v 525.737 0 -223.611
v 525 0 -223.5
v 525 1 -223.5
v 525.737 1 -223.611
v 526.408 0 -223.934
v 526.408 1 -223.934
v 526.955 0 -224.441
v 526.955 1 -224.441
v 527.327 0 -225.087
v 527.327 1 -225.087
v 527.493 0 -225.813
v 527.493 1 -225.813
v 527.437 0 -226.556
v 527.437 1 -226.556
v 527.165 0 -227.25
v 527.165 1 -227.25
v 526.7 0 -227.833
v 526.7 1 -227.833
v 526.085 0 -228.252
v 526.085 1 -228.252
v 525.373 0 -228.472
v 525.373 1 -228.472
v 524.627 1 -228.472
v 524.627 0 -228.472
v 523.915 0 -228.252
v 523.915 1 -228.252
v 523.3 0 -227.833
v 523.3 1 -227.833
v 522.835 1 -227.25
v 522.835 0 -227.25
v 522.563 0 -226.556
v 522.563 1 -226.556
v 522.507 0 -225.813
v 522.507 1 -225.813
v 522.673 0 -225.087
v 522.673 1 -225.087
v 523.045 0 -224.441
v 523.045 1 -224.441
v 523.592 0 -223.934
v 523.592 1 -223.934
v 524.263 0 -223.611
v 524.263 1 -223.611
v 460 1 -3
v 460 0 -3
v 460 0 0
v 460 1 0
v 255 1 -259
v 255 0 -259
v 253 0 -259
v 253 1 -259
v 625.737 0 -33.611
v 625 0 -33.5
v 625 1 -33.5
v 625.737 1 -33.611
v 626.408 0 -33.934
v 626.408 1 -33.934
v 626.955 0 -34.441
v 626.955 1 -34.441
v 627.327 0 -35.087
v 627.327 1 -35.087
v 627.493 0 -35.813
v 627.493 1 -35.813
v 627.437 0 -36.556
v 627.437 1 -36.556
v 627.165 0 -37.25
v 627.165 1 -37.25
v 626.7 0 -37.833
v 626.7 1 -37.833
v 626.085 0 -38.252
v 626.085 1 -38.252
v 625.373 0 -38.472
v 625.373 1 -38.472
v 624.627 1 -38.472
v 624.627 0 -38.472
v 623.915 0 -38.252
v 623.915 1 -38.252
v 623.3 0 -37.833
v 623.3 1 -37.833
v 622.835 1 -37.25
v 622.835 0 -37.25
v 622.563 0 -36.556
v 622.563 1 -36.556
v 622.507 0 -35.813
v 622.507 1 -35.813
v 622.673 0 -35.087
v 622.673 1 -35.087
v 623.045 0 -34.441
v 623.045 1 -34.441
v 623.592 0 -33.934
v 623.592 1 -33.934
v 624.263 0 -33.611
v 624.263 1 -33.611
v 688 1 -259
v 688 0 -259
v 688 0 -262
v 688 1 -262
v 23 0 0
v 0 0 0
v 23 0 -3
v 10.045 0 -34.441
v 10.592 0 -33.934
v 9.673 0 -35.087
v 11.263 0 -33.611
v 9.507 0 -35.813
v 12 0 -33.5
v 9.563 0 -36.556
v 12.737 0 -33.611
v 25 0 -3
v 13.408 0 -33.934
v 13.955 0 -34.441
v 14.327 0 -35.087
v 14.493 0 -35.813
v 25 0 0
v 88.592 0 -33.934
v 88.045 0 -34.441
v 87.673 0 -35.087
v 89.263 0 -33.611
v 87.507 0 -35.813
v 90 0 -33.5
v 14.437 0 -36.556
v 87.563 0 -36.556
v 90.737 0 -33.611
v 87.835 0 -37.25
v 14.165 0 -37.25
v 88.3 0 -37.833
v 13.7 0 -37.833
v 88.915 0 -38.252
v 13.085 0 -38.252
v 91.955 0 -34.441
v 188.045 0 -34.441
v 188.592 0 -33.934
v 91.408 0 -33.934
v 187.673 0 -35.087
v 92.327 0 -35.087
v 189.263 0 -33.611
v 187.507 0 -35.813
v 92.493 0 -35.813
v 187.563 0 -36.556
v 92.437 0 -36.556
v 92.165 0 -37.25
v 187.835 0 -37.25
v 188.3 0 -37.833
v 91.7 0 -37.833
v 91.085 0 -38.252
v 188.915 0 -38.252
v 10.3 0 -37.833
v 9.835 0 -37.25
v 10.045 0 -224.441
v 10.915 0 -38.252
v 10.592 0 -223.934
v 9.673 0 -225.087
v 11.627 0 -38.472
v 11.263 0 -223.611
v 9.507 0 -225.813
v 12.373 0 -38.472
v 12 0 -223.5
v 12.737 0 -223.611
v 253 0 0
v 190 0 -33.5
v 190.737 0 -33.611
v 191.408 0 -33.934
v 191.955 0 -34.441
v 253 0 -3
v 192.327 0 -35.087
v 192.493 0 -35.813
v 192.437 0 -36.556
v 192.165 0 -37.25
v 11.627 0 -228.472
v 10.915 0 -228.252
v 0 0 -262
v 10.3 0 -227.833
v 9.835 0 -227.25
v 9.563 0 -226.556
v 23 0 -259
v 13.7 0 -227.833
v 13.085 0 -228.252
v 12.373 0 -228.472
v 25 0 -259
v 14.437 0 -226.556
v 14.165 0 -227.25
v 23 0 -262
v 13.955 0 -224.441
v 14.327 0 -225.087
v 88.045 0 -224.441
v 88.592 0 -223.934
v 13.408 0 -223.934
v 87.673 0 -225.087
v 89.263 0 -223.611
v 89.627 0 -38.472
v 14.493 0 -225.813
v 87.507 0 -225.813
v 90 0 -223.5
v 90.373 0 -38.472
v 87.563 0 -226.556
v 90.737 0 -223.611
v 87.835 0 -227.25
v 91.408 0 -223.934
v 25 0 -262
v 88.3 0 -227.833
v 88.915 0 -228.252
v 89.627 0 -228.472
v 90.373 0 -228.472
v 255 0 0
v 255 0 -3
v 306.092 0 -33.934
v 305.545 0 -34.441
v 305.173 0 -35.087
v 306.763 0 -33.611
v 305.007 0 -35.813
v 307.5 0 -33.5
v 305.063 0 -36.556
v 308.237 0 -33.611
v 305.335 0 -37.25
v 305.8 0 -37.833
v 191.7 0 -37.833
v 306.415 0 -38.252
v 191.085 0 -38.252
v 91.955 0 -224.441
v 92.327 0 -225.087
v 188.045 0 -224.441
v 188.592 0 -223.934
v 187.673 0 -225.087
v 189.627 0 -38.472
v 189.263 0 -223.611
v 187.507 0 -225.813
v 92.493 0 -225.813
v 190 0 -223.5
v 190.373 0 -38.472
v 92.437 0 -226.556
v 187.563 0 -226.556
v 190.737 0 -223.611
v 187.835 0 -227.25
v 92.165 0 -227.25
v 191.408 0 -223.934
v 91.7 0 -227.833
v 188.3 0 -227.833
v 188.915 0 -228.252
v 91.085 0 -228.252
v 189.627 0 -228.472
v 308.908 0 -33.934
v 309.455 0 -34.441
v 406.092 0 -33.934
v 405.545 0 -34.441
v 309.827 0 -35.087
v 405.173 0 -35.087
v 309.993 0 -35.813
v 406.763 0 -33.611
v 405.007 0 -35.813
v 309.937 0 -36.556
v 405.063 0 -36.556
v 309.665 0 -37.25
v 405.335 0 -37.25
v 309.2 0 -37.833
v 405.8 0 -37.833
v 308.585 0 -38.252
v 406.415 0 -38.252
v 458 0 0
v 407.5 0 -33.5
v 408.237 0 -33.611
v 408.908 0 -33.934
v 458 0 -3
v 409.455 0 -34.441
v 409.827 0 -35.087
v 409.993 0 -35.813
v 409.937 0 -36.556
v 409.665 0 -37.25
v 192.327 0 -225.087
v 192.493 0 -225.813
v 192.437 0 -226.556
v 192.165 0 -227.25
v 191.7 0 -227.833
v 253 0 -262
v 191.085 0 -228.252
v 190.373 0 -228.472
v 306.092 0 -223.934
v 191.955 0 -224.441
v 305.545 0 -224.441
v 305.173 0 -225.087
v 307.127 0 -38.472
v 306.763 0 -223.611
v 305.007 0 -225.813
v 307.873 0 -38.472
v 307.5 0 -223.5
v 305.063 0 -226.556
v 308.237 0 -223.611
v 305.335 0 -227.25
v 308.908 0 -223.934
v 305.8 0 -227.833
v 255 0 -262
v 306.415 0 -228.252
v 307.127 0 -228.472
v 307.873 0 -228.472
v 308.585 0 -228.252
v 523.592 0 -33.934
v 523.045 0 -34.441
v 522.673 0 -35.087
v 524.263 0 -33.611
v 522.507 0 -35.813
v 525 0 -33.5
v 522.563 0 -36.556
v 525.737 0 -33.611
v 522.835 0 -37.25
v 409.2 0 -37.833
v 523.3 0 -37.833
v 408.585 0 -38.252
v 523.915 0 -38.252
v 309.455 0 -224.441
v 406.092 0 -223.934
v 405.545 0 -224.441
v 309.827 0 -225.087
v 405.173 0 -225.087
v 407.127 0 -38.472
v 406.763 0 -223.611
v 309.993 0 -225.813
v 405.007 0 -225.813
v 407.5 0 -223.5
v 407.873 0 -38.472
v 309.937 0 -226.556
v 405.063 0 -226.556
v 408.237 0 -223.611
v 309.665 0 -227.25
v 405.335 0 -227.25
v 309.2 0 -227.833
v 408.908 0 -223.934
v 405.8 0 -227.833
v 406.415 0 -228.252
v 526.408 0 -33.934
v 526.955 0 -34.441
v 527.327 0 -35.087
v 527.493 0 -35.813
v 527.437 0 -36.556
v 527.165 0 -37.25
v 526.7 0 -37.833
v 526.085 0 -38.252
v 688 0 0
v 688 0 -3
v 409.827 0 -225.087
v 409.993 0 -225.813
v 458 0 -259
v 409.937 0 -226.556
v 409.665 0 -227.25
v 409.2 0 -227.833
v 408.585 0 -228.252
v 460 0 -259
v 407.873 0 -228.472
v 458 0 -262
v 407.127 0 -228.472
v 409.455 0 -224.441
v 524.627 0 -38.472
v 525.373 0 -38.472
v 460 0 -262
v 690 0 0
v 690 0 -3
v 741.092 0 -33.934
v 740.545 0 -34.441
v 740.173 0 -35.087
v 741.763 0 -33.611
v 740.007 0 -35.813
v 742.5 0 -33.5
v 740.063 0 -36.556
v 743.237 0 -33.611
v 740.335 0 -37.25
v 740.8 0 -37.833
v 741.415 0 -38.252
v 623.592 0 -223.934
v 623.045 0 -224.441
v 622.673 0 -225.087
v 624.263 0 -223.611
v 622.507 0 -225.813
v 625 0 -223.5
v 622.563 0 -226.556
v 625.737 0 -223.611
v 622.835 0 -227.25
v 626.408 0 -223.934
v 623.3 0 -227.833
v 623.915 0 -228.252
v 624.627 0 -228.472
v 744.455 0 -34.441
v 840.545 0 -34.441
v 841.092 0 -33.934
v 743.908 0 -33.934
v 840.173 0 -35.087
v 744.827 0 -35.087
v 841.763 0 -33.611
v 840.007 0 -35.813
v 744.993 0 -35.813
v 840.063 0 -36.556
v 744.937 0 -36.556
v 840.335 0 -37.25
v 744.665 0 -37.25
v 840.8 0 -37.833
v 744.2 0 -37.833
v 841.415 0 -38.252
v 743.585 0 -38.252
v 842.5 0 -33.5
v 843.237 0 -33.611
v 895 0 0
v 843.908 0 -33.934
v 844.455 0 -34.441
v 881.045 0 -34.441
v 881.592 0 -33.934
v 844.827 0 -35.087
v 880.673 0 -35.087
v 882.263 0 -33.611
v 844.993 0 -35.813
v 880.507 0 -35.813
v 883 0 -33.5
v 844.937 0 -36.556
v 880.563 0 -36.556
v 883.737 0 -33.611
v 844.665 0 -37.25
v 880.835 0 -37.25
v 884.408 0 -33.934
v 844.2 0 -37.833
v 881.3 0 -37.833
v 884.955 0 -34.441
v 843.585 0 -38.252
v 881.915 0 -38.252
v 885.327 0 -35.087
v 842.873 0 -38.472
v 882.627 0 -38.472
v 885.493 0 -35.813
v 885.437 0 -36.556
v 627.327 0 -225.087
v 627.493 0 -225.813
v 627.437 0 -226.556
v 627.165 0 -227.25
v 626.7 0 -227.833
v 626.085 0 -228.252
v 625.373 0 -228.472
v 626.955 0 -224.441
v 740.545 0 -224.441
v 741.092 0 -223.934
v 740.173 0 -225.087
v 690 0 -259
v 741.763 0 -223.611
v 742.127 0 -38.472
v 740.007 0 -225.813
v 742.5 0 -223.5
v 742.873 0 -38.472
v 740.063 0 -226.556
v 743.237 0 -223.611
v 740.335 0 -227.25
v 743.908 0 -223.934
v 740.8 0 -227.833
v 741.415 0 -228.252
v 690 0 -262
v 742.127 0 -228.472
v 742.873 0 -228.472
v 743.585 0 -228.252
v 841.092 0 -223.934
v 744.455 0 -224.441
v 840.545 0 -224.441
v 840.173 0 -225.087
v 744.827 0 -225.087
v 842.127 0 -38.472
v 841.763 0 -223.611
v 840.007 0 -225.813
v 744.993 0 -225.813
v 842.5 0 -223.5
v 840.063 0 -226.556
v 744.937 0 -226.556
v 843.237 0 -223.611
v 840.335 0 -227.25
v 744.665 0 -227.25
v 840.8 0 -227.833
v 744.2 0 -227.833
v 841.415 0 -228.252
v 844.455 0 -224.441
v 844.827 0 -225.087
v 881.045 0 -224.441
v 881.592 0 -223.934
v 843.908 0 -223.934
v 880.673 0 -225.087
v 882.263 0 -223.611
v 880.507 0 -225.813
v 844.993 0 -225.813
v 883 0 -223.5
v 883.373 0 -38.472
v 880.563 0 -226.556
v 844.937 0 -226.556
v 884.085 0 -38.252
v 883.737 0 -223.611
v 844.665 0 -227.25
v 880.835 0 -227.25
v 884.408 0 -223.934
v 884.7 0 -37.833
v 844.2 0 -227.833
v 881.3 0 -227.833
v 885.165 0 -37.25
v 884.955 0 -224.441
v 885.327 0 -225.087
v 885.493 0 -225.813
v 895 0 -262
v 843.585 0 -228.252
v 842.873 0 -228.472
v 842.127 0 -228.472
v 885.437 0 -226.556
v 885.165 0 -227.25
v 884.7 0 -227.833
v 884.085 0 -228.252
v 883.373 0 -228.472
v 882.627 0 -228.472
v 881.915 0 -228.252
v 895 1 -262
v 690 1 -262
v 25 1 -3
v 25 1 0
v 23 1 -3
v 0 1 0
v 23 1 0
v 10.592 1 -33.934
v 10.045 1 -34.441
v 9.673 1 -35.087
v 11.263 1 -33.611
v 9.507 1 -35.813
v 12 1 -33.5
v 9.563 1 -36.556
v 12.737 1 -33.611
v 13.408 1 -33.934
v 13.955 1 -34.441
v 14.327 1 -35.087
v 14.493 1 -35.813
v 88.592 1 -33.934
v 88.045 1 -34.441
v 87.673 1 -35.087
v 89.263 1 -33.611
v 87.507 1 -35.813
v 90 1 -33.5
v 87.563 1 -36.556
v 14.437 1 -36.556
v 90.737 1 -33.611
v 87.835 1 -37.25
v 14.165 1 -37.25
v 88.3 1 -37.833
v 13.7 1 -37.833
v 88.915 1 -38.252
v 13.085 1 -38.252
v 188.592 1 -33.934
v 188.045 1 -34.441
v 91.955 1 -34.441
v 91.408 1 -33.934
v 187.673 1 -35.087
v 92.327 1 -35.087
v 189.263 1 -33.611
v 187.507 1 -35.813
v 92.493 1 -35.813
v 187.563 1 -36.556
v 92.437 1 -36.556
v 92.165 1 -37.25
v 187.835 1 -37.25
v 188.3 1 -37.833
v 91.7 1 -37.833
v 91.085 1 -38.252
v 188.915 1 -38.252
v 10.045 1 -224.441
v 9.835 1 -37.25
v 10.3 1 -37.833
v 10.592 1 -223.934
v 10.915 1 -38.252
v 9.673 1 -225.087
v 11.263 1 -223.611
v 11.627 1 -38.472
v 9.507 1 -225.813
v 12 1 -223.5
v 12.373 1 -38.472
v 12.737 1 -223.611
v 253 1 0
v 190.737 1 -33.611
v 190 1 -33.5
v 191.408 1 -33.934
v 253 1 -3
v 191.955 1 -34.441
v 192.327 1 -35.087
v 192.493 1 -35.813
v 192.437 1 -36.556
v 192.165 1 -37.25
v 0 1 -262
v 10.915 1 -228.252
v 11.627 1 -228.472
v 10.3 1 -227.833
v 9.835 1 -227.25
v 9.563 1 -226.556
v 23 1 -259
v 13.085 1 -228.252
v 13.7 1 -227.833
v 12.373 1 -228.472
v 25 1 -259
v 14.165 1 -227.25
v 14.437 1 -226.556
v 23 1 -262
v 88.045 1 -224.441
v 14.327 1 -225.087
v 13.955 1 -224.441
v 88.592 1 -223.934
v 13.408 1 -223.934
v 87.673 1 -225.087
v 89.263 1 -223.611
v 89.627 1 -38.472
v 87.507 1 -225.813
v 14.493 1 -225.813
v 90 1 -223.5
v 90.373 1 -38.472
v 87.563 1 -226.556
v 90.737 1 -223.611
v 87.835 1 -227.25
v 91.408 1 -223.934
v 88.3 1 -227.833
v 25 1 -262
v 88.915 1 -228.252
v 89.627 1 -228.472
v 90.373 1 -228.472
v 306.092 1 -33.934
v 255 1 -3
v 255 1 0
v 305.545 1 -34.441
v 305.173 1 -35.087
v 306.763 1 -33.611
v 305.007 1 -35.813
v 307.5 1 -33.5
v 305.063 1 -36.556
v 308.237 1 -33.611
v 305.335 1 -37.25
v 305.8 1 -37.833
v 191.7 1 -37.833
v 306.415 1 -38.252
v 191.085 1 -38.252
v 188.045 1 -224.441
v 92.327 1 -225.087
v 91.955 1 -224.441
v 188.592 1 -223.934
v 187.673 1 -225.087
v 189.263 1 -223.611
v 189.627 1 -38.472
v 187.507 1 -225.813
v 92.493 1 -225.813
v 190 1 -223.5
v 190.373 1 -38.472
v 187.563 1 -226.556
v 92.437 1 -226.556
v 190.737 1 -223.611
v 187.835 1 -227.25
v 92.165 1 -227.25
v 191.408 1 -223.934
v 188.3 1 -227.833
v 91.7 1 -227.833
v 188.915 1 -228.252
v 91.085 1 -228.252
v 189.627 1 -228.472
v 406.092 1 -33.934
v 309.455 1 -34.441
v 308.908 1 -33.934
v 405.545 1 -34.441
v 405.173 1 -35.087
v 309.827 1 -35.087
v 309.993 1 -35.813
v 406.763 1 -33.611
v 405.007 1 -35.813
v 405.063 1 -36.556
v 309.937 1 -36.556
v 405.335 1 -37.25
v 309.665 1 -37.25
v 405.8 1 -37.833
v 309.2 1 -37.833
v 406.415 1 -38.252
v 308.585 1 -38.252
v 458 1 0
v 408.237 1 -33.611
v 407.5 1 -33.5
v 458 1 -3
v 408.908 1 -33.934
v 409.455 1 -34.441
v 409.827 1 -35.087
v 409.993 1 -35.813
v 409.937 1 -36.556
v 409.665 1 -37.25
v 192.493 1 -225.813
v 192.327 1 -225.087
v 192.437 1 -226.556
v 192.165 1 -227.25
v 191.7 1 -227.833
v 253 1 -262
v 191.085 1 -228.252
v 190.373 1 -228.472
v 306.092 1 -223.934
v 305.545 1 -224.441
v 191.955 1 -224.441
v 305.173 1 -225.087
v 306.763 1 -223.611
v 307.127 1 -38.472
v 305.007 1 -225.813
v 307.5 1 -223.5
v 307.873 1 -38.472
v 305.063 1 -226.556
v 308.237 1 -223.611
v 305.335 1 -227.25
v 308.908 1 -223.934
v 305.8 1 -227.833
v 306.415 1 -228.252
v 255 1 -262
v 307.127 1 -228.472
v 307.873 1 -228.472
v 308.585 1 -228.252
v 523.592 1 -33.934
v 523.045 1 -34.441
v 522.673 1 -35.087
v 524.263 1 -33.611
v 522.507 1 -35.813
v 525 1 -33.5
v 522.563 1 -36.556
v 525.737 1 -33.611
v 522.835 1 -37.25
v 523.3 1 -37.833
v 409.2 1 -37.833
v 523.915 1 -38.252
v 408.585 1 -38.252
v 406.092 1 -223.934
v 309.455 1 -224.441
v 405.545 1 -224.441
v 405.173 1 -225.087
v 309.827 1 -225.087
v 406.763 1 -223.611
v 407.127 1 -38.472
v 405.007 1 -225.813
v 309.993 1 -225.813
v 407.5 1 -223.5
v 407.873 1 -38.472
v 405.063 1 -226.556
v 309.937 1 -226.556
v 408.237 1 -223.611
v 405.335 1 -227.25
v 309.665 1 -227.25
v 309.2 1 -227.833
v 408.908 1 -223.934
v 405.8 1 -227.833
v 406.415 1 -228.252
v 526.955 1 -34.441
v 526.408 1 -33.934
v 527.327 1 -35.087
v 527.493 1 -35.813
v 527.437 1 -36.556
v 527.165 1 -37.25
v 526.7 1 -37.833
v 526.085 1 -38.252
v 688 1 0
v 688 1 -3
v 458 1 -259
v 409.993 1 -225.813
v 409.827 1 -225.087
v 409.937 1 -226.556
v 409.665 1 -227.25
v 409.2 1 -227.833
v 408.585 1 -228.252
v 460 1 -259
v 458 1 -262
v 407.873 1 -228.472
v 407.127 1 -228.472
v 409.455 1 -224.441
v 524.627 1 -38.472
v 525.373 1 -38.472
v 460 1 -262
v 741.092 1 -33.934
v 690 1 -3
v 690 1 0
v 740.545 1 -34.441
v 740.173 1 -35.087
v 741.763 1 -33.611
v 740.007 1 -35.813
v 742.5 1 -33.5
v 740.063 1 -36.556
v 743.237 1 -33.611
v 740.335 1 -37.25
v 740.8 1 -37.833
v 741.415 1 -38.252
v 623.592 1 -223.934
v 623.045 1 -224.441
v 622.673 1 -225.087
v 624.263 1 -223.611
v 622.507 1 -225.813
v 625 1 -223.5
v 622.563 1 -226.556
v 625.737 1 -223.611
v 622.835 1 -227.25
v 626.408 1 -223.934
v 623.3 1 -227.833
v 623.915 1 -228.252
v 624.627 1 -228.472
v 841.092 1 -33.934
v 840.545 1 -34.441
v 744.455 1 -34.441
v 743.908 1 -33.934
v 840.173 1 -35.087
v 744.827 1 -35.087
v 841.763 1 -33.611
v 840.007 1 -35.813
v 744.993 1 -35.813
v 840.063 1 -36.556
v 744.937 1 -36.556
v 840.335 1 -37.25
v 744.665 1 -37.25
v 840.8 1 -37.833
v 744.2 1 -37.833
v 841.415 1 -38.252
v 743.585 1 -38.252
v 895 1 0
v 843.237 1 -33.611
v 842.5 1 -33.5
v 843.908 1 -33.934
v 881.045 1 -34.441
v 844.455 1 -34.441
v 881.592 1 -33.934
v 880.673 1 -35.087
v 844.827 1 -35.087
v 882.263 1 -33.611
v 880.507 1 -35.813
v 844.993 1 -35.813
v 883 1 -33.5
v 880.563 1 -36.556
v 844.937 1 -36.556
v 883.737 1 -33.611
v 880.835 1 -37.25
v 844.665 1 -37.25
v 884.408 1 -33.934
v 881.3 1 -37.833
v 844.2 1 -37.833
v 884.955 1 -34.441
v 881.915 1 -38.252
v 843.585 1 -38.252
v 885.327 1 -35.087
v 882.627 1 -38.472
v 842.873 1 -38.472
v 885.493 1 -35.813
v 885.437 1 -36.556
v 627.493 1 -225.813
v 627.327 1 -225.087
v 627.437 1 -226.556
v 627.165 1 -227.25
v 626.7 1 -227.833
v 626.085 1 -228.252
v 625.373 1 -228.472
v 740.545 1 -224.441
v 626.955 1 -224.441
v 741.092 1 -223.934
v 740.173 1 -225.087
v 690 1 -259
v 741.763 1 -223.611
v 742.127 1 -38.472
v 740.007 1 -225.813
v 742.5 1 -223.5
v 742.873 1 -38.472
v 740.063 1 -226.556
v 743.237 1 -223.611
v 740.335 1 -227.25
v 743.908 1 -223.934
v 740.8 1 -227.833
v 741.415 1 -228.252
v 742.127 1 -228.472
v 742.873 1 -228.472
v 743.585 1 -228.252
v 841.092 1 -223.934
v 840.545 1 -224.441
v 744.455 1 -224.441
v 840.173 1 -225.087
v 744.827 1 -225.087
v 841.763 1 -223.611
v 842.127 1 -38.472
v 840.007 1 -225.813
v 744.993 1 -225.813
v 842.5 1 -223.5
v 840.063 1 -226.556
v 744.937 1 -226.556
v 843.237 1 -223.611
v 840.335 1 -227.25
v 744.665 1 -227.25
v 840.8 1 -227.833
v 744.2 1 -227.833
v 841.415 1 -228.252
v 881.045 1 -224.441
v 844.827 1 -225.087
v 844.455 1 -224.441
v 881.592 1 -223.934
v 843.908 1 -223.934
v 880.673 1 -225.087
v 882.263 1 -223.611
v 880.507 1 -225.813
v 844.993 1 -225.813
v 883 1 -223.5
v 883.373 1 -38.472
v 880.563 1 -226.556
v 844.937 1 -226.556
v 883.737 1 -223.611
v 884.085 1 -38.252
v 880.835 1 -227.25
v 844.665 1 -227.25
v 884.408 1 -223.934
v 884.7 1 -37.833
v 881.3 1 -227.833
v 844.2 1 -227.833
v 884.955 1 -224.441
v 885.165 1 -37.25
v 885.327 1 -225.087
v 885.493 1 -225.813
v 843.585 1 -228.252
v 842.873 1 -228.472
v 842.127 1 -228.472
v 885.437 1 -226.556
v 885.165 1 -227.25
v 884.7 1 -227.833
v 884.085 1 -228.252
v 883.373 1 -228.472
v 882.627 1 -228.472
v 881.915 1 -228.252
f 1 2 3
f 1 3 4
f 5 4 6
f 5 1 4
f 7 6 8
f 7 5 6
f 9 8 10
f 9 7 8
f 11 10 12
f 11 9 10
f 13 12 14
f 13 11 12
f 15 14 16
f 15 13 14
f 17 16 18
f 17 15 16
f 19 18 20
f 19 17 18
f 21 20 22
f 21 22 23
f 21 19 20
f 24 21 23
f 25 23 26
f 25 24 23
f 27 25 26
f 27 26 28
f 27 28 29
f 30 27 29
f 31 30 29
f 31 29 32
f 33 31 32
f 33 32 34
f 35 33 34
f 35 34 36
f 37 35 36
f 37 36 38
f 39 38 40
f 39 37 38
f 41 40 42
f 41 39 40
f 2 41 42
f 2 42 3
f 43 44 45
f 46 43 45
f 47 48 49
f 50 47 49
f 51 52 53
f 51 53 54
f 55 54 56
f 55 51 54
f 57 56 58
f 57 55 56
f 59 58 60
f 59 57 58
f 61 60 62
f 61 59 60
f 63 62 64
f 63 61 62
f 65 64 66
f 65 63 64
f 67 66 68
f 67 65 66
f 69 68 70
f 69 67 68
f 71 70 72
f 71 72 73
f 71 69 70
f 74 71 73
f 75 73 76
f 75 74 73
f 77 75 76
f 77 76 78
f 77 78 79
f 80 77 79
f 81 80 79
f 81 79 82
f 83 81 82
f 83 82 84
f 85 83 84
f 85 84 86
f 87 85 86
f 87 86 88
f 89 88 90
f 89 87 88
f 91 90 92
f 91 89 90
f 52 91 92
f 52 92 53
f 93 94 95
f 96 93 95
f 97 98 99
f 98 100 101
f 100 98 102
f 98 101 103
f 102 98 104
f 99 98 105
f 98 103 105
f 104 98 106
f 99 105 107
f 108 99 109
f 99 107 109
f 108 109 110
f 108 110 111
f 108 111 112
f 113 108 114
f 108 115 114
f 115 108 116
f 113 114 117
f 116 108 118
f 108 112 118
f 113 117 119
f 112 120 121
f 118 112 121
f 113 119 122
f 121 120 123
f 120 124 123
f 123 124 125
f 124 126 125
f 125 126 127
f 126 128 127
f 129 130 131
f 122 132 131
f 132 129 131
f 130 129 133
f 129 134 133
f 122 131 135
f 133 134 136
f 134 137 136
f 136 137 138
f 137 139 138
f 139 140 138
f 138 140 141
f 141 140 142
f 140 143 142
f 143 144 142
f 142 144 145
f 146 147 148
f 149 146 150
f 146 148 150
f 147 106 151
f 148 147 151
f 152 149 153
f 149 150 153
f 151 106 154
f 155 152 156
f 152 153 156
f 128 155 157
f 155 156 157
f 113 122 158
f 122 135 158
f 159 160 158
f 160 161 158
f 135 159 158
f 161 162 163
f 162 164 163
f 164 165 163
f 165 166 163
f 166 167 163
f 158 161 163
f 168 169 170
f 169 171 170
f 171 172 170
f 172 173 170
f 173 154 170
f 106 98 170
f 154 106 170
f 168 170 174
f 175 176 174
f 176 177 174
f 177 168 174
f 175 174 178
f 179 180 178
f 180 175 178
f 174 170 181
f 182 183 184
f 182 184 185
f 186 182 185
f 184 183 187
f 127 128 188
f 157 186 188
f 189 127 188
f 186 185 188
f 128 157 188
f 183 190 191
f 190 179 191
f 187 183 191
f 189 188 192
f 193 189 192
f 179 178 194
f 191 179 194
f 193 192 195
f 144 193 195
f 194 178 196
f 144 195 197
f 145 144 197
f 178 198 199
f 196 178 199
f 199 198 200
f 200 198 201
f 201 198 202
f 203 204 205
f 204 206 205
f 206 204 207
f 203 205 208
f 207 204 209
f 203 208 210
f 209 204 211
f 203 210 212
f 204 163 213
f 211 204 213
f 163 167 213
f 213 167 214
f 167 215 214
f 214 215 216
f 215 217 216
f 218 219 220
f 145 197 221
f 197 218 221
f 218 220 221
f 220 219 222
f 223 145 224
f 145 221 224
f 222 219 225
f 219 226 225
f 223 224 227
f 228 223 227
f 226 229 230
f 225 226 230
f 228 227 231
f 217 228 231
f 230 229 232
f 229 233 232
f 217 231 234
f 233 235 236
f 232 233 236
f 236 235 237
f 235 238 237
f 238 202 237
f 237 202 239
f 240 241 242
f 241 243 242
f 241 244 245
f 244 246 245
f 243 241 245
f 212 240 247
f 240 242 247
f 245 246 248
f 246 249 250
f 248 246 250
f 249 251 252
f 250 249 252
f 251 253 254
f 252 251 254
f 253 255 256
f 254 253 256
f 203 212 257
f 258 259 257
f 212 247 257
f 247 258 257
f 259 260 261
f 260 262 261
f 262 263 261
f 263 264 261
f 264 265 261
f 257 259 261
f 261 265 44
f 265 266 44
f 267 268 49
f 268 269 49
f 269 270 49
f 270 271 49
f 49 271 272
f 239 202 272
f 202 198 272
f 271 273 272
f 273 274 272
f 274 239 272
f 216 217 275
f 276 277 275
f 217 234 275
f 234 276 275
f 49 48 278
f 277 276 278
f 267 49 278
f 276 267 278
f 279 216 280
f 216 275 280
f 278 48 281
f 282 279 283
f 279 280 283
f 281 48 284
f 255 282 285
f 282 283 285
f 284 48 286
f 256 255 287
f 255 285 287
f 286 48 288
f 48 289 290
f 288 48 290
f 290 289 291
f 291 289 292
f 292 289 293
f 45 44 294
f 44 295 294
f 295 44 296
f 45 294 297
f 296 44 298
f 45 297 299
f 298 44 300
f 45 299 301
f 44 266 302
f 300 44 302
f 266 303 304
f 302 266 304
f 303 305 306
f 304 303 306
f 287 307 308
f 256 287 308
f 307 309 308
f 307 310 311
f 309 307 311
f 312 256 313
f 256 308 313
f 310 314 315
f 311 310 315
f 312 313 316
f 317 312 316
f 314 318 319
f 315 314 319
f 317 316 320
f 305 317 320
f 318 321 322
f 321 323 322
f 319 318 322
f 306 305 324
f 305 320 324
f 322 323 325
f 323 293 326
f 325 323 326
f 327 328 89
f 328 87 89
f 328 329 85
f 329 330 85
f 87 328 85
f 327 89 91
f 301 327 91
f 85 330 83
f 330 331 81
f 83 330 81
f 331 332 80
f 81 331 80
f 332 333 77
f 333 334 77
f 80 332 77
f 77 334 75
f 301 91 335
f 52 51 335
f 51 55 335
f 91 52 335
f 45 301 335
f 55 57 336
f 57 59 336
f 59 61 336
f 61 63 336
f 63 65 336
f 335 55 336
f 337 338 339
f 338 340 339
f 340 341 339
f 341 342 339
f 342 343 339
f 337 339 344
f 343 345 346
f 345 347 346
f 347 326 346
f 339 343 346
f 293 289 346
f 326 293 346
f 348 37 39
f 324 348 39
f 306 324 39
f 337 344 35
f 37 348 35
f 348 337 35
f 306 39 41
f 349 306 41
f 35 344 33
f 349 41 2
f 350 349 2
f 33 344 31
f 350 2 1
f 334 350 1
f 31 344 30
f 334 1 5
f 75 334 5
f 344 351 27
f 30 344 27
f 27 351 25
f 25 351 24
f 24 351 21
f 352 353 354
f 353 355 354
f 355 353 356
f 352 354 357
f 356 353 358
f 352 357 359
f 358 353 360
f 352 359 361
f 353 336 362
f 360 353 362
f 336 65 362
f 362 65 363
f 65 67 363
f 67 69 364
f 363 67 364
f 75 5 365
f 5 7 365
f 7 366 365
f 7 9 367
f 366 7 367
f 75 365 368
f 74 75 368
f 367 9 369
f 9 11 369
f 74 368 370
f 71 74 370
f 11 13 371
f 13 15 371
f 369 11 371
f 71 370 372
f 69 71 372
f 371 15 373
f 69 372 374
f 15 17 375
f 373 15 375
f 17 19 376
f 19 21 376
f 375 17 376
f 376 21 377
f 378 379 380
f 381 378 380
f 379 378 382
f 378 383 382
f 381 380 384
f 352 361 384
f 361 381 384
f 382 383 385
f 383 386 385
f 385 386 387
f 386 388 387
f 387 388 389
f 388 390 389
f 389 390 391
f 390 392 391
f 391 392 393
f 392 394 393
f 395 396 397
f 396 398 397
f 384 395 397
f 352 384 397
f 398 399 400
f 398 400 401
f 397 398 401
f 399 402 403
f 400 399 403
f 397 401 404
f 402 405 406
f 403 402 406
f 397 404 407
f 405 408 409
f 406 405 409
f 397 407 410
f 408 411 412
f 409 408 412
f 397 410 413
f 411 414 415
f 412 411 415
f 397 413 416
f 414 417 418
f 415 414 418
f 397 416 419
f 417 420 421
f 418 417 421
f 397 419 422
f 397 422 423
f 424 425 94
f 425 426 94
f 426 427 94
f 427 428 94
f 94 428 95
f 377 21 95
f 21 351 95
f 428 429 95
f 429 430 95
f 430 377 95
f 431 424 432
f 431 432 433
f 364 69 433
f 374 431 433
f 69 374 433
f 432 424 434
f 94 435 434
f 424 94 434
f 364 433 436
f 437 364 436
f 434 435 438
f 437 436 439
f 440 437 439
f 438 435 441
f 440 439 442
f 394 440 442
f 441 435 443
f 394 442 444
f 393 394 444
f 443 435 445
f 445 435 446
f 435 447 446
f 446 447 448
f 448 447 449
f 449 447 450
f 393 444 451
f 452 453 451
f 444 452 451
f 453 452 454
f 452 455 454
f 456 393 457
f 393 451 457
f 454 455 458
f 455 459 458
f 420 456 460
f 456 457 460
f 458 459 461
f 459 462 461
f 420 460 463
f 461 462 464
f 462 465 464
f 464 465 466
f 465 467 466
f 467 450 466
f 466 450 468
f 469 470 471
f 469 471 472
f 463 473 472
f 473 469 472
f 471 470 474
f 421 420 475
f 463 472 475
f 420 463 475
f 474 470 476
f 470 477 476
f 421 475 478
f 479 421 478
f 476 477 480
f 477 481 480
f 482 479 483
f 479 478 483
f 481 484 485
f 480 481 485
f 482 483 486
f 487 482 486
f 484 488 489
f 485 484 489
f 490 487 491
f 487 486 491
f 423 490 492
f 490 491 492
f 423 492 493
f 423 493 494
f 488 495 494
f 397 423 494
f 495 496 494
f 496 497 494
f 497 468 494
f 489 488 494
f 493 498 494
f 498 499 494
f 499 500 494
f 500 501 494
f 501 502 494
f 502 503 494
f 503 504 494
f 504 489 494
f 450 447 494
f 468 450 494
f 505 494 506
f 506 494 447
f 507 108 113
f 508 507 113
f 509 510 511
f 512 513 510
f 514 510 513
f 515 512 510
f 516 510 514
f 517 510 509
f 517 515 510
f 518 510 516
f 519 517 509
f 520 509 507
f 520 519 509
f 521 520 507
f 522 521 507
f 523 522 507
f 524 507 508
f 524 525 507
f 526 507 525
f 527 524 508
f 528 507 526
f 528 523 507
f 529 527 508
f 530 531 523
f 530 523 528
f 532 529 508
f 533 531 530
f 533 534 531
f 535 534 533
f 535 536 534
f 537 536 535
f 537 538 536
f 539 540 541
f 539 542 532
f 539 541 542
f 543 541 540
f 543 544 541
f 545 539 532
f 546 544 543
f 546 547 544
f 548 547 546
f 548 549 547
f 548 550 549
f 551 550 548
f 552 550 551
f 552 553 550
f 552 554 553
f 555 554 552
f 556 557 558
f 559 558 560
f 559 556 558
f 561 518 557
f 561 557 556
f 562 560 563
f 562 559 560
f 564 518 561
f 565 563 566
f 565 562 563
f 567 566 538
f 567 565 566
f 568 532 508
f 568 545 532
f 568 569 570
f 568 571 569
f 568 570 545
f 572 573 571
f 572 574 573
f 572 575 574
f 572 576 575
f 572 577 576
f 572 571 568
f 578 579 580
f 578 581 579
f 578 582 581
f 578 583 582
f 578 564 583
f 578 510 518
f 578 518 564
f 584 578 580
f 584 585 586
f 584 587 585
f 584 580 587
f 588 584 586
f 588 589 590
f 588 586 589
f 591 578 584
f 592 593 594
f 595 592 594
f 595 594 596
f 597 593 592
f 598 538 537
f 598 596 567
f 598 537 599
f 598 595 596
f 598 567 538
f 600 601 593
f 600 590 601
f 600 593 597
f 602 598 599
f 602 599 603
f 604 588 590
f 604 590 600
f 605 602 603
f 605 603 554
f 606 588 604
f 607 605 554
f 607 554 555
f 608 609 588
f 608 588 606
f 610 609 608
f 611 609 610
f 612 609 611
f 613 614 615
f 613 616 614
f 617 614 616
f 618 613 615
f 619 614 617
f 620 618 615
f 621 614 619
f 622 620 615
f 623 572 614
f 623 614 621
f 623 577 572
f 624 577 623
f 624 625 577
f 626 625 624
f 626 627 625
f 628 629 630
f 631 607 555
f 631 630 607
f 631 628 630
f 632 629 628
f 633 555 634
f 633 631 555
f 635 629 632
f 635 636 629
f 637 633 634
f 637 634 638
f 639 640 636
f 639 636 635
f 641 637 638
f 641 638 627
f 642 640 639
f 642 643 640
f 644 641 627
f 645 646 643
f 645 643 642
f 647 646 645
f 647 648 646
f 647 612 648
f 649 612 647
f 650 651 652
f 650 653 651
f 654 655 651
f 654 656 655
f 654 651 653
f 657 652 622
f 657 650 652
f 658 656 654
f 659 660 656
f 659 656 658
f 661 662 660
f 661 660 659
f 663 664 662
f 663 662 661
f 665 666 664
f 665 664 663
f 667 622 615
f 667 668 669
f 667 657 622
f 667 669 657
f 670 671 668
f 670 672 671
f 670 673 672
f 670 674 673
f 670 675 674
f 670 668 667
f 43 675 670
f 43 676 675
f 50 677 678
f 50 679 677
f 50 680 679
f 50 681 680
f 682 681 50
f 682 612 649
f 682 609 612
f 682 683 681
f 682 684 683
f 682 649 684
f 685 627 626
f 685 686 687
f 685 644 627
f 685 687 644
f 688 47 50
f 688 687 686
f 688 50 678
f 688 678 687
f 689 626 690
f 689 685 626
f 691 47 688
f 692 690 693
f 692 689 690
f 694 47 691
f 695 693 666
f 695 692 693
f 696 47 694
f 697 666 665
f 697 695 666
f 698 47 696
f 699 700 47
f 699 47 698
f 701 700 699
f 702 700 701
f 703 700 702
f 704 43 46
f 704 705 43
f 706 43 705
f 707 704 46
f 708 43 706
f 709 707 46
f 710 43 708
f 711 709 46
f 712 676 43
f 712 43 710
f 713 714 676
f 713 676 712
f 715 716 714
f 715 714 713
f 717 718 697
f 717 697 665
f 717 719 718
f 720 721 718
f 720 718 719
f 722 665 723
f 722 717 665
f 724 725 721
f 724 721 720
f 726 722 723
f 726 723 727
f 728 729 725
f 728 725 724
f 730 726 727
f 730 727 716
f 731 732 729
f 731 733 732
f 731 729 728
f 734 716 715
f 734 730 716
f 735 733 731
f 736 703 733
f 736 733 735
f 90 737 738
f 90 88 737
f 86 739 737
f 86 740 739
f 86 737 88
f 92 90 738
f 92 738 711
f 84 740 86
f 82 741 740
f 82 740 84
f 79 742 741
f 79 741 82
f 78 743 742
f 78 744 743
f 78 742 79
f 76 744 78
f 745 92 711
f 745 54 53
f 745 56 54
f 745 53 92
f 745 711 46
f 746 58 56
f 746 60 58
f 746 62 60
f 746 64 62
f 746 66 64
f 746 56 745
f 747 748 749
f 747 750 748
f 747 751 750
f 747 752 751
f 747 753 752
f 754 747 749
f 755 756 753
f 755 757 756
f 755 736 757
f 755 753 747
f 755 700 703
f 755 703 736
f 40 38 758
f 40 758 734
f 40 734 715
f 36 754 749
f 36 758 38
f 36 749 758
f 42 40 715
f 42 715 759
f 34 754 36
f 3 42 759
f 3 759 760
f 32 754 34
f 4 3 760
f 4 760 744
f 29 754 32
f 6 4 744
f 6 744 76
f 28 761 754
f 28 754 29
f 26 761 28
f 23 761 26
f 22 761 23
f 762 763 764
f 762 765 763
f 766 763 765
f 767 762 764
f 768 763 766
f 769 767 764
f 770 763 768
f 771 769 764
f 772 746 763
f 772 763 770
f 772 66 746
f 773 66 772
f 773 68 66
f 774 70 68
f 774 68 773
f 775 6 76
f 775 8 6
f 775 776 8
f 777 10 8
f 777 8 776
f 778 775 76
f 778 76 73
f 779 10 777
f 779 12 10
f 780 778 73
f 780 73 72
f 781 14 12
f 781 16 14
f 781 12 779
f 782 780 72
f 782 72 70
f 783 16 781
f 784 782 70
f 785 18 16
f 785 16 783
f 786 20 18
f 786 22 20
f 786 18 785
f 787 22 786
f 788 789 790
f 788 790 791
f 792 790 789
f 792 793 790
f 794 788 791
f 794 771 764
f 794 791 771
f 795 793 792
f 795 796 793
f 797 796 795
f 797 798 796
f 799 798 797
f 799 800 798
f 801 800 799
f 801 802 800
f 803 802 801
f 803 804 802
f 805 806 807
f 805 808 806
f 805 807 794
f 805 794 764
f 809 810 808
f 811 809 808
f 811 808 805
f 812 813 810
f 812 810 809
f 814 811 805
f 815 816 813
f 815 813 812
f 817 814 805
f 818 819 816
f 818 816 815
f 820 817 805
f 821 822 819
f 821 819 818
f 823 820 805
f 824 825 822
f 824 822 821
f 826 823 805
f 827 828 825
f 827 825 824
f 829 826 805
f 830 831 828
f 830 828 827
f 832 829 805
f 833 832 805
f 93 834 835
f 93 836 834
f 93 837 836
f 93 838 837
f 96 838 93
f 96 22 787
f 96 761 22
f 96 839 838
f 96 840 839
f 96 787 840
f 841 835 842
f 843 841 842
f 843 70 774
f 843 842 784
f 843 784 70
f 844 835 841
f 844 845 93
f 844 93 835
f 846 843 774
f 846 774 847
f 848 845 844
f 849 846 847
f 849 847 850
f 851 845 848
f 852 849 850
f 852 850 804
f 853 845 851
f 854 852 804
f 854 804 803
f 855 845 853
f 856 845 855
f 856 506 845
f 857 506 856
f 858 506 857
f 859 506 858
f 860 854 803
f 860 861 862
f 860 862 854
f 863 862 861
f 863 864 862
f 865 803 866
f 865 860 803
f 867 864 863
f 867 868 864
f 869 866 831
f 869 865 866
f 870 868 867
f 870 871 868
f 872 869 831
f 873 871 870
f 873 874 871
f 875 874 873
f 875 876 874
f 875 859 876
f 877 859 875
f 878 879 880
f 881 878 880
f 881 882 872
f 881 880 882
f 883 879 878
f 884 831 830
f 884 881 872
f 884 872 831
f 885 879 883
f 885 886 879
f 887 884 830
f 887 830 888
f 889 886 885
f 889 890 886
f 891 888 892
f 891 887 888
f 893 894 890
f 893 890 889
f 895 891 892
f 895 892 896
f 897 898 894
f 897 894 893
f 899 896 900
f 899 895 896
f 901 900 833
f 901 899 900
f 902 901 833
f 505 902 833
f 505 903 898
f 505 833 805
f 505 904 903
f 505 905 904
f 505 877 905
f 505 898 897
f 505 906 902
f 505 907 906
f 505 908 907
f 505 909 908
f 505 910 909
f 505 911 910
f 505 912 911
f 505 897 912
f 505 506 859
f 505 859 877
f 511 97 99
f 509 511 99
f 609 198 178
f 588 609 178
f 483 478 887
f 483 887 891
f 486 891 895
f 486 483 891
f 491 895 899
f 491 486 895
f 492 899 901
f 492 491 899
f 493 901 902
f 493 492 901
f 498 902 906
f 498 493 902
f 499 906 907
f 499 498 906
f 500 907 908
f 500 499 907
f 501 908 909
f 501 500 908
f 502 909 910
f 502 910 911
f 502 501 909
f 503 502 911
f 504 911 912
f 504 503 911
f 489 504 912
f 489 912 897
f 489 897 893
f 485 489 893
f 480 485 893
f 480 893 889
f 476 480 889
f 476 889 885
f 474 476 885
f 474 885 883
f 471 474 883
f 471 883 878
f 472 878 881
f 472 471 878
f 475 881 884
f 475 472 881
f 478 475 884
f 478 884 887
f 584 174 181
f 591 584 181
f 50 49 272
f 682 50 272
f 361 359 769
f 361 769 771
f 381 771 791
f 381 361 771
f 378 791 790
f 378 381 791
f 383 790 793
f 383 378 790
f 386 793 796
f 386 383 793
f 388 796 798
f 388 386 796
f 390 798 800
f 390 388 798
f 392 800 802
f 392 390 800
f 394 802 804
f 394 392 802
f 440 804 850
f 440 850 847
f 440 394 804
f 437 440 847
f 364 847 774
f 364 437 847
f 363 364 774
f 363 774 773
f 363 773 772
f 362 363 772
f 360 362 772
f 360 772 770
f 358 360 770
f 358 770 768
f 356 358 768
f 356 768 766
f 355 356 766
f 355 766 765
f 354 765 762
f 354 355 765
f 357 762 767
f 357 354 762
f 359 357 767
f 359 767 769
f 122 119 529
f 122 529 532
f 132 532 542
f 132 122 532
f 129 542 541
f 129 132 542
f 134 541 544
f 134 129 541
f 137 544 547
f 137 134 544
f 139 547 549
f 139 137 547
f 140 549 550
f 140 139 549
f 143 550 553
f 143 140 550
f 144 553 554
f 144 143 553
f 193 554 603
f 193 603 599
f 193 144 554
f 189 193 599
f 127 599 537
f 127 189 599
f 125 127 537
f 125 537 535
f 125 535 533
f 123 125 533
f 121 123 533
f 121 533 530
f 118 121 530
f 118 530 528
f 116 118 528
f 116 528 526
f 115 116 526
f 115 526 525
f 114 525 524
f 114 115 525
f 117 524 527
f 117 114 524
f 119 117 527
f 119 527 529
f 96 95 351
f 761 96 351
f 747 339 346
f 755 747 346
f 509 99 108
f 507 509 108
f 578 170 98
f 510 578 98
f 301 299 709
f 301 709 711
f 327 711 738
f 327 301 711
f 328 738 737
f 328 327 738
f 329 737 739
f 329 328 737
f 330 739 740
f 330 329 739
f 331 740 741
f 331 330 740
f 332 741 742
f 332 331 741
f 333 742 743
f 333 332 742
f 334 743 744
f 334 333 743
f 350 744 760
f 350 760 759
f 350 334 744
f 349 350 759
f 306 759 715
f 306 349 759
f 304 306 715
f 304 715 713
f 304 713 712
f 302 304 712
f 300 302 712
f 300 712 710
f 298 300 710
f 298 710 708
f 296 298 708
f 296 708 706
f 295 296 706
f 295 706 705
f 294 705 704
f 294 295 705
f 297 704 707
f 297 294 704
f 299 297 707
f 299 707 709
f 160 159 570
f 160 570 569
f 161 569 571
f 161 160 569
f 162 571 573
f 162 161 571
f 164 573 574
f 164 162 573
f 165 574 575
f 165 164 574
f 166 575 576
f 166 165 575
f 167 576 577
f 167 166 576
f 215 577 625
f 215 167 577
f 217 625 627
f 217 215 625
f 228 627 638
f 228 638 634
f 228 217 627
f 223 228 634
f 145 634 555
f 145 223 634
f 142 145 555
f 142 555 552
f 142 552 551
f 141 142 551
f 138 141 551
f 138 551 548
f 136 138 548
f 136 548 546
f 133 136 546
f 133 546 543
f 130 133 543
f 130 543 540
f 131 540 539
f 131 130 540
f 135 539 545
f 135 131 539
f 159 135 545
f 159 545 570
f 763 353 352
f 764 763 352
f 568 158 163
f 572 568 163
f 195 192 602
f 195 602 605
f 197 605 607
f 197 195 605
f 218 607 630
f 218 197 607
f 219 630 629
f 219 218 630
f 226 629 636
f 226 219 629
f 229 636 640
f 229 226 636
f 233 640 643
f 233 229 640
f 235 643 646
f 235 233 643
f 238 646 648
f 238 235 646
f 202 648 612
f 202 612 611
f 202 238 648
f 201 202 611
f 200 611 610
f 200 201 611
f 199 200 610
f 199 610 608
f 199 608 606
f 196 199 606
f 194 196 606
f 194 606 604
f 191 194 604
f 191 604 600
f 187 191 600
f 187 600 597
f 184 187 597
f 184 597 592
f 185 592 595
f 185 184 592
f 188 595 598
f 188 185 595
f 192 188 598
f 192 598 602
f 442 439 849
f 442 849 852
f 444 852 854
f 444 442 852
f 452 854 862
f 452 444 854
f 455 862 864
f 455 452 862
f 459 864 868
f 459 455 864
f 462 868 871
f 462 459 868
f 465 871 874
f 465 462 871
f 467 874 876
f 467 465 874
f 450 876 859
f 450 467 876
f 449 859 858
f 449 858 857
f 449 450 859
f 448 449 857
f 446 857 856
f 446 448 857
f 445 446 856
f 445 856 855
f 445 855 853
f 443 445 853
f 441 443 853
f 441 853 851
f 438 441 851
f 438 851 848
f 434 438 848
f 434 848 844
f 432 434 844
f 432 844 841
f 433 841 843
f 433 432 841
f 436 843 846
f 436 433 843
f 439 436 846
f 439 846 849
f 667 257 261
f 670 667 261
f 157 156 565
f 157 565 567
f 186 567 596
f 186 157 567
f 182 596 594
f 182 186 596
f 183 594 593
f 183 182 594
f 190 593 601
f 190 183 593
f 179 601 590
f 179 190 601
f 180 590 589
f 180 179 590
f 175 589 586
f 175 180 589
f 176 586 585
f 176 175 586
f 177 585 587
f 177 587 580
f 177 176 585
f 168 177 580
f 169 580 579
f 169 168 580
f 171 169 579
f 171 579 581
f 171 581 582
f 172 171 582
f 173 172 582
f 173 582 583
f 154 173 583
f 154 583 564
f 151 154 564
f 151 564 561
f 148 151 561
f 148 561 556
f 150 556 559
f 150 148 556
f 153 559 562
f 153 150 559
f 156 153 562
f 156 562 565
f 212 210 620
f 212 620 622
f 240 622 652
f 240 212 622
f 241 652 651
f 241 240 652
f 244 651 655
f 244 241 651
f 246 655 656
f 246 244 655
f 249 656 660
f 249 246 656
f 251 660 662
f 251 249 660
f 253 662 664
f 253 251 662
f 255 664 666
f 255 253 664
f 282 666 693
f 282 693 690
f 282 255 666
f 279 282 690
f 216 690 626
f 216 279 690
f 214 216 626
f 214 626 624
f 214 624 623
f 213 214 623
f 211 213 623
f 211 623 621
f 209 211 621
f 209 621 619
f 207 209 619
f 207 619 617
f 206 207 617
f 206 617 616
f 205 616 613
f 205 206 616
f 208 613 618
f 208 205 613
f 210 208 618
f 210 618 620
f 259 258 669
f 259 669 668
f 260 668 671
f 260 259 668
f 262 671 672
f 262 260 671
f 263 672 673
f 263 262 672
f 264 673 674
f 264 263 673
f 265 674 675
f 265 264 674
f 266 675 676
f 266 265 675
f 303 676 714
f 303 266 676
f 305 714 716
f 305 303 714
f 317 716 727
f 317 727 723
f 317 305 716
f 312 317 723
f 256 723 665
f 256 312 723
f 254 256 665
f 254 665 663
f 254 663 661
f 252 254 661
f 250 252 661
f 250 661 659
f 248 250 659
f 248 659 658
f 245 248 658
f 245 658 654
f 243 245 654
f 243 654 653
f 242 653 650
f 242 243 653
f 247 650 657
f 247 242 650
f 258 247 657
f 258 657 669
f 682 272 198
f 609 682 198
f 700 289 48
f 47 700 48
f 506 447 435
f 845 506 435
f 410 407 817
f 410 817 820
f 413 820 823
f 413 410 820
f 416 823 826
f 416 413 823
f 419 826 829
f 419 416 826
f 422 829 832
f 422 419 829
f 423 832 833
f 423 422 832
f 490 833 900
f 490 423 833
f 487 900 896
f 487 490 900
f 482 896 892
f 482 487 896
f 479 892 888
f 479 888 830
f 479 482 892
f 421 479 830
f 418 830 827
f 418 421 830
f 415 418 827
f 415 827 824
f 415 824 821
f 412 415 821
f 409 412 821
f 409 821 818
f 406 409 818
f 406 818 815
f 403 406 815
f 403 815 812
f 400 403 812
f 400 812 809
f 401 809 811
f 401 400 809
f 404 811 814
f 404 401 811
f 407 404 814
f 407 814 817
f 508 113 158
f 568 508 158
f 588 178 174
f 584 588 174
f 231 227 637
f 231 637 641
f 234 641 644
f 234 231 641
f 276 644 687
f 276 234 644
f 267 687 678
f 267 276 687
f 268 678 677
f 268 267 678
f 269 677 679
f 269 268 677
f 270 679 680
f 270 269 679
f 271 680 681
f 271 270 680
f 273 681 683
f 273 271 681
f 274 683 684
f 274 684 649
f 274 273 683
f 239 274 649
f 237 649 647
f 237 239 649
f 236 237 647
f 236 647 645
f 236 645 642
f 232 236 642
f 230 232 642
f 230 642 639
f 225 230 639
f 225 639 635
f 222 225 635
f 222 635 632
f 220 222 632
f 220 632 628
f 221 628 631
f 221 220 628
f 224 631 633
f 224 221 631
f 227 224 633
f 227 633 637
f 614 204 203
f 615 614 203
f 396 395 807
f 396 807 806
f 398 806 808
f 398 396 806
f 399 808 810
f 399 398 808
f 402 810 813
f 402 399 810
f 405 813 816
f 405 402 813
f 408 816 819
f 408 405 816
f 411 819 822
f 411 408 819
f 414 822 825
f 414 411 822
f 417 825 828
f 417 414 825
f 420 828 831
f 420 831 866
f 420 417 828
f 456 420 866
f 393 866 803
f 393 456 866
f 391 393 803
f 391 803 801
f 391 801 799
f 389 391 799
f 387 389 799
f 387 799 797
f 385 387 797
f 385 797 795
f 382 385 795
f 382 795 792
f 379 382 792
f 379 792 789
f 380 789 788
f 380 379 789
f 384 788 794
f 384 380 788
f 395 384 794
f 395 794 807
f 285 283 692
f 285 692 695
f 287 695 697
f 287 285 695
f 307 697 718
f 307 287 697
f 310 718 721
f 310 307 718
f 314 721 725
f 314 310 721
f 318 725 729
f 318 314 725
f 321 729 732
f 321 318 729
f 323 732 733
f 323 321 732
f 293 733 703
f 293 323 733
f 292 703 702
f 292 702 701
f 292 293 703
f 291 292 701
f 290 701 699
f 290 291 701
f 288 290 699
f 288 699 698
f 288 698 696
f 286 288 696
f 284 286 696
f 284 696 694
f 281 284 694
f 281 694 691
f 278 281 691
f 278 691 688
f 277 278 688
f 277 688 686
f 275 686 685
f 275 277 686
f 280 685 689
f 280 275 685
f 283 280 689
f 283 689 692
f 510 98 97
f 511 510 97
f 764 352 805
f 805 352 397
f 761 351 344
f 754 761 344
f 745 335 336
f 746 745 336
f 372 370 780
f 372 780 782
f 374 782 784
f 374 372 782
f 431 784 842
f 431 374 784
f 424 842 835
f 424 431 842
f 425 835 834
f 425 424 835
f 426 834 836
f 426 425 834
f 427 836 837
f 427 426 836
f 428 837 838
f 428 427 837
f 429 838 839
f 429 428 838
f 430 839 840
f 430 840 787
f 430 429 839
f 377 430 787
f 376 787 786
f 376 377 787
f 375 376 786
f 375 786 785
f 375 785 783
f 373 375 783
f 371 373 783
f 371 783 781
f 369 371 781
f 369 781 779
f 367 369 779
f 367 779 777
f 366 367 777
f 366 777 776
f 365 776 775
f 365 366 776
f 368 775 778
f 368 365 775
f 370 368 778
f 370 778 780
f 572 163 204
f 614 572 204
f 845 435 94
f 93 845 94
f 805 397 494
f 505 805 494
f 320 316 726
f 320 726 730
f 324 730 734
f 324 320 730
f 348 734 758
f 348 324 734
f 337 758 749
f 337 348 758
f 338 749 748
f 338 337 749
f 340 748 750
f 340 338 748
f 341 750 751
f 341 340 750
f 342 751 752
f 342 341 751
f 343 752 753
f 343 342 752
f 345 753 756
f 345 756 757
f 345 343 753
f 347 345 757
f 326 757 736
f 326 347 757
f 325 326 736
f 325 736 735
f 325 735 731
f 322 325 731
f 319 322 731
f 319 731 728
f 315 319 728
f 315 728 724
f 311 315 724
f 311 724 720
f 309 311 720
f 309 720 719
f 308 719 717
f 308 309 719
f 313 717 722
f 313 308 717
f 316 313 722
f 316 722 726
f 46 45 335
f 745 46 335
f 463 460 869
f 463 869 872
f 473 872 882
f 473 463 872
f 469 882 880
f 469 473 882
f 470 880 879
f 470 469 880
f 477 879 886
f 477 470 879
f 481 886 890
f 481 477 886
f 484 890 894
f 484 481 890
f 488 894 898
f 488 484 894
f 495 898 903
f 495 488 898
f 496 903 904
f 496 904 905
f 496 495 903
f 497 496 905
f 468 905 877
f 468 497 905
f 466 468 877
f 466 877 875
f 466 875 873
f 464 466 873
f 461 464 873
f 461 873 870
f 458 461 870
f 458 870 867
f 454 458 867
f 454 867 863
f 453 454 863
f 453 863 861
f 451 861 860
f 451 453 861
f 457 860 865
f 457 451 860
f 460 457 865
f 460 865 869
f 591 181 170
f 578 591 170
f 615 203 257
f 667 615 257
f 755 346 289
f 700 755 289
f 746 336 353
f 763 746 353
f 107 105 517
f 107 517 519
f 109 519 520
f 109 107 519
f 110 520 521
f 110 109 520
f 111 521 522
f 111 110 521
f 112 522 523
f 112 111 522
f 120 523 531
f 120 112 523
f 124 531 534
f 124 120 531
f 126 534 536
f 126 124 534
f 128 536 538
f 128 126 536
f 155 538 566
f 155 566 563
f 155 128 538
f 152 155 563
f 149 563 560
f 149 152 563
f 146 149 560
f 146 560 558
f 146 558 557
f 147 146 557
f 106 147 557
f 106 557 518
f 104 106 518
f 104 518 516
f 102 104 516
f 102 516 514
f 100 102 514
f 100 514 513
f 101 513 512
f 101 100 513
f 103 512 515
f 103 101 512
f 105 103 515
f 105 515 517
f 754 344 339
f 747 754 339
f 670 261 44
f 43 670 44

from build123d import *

# Parameters (mm, degrees)
SKETCH1_R           = 2.5
BOSS_EXTRUDE1_DEPTH = 1


with BuildPart() as part:
    # Sketch1 → Boss-Extrude1 (new body)
    with BuildSketch(Plane(origin=(0, 0, 0), x_dir=(1, 0, 0), z_dir=(0, 1, 0))):
        Polygon((0, 0), (23, 0), (23, 3), (25, 3), (25, 0), (253, 0), (253, 3), (255, 3), (255, 0), (458, 0), (458, 3), (460, 3), (460, 0), (688, 0), (688, 3), (690, 3), (690, 0), (895, 0), (895, 262), (690, 262), (690, 259), (688, 259), (688, 262), (460, 262), (460, 259), (458, 259), (458, 262), (255, 262), (255, 259), (253, 259), (253, 262), (25, 262), (25, 259), (23, 259), (23, 262), (0, 262), align=None)
        with Locations(Location((90, 226, 0), (0, 0, 270))):
            Circle(SKETCH1_R, mode=Mode.SUBTRACT)
        with Locations(Location((190, 226, 0), (0, 0, 270))):
            Circle(SKETCH1_R, mode=Mode.SUBTRACT)
        with Locations(Location((307.5, 226, 0), (0, 0, 270))):
            Circle(SKETCH1_R, mode=Mode.SUBTRACT)
        with Locations(Location((407.5, 226, 0), (0, 0, 270))):
            Circle(SKETCH1_R, mode=Mode.SUBTRACT)
        with Locations(Location((525, 226, 0), (0, 0, 270))):
            Circle(SKETCH1_R, mode=Mode.SUBTRACT)
        with Locations(Location((625, 226, 0), (0, 0, 270))):
            Circle(SKETCH1_R, mode=Mode.SUBTRACT)
        with Locations(Location((742.5, 226, 0), (0, 0, 270))):
            Circle(SKETCH1_R, mode=Mode.SUBTRACT)
        with Locations(Location((842.5, 226, 0), (0, 0, 270))):
            Circle(SKETCH1_R, mode=Mode.SUBTRACT)
        with Locations(Location((842.5, 36, 0), (0, 0, 270))):
            Circle(SKETCH1_R, mode=Mode.SUBTRACT)
        with Locations(Location((742.5, 36, 0), (0, 0, 270))):
            Circle(SKETCH1_R, mode=Mode.SUBTRACT)
        with Locations(Location((625, 36, 0), (0, 0, 270))):
            Circle(SKETCH1_R, mode=Mode.SUBTRACT)
        with Locations(Location((525, 36, 0), (0, 0, 270))):
            Circle(SKETCH1_R, mode=Mode.SUBTRACT)
        with Locations(Location((407.5, 36, 0), (0, 0, 270))):
            Circle(SKETCH1_R, mode=Mode.SUBTRACT)
        with Locations(Location((307.5, 36, 0), (0, 0, 270))):
            Circle(SKETCH1_R, mode=Mode.SUBTRACT)
        with Locations(Location((190, 36, 0), (0, 0, 270))):
            Circle(SKETCH1_R, mode=Mode.SUBTRACT)
        with Locations(Location((90, 36, 0), (0, 0, 270))):
            Circle(SKETCH1_R, mode=Mode.SUBTRACT)
        with Locations(Location((12, 36, 0), (0, 0, 270))):
            Circle(SKETCH1_R, mode=Mode.SUBTRACT)
        with Locations(Location((12, 226, 0), (0, 0, 270))):
            Circle(SKETCH1_R, mode=Mode.SUBTRACT)
        with Locations(Location((883, 226, 0), (0, 0, 270))):
            Circle(SKETCH1_R, mode=Mode.SUBTRACT)
        with Locations(Location((883, 36, 0), (0, 0, 270))):
            Circle(SKETCH1_R, mode=Mode.SUBTRACT)
    extrude(amount=BOSS_EXTRUDE1_DEPTH)


solid = part.part
